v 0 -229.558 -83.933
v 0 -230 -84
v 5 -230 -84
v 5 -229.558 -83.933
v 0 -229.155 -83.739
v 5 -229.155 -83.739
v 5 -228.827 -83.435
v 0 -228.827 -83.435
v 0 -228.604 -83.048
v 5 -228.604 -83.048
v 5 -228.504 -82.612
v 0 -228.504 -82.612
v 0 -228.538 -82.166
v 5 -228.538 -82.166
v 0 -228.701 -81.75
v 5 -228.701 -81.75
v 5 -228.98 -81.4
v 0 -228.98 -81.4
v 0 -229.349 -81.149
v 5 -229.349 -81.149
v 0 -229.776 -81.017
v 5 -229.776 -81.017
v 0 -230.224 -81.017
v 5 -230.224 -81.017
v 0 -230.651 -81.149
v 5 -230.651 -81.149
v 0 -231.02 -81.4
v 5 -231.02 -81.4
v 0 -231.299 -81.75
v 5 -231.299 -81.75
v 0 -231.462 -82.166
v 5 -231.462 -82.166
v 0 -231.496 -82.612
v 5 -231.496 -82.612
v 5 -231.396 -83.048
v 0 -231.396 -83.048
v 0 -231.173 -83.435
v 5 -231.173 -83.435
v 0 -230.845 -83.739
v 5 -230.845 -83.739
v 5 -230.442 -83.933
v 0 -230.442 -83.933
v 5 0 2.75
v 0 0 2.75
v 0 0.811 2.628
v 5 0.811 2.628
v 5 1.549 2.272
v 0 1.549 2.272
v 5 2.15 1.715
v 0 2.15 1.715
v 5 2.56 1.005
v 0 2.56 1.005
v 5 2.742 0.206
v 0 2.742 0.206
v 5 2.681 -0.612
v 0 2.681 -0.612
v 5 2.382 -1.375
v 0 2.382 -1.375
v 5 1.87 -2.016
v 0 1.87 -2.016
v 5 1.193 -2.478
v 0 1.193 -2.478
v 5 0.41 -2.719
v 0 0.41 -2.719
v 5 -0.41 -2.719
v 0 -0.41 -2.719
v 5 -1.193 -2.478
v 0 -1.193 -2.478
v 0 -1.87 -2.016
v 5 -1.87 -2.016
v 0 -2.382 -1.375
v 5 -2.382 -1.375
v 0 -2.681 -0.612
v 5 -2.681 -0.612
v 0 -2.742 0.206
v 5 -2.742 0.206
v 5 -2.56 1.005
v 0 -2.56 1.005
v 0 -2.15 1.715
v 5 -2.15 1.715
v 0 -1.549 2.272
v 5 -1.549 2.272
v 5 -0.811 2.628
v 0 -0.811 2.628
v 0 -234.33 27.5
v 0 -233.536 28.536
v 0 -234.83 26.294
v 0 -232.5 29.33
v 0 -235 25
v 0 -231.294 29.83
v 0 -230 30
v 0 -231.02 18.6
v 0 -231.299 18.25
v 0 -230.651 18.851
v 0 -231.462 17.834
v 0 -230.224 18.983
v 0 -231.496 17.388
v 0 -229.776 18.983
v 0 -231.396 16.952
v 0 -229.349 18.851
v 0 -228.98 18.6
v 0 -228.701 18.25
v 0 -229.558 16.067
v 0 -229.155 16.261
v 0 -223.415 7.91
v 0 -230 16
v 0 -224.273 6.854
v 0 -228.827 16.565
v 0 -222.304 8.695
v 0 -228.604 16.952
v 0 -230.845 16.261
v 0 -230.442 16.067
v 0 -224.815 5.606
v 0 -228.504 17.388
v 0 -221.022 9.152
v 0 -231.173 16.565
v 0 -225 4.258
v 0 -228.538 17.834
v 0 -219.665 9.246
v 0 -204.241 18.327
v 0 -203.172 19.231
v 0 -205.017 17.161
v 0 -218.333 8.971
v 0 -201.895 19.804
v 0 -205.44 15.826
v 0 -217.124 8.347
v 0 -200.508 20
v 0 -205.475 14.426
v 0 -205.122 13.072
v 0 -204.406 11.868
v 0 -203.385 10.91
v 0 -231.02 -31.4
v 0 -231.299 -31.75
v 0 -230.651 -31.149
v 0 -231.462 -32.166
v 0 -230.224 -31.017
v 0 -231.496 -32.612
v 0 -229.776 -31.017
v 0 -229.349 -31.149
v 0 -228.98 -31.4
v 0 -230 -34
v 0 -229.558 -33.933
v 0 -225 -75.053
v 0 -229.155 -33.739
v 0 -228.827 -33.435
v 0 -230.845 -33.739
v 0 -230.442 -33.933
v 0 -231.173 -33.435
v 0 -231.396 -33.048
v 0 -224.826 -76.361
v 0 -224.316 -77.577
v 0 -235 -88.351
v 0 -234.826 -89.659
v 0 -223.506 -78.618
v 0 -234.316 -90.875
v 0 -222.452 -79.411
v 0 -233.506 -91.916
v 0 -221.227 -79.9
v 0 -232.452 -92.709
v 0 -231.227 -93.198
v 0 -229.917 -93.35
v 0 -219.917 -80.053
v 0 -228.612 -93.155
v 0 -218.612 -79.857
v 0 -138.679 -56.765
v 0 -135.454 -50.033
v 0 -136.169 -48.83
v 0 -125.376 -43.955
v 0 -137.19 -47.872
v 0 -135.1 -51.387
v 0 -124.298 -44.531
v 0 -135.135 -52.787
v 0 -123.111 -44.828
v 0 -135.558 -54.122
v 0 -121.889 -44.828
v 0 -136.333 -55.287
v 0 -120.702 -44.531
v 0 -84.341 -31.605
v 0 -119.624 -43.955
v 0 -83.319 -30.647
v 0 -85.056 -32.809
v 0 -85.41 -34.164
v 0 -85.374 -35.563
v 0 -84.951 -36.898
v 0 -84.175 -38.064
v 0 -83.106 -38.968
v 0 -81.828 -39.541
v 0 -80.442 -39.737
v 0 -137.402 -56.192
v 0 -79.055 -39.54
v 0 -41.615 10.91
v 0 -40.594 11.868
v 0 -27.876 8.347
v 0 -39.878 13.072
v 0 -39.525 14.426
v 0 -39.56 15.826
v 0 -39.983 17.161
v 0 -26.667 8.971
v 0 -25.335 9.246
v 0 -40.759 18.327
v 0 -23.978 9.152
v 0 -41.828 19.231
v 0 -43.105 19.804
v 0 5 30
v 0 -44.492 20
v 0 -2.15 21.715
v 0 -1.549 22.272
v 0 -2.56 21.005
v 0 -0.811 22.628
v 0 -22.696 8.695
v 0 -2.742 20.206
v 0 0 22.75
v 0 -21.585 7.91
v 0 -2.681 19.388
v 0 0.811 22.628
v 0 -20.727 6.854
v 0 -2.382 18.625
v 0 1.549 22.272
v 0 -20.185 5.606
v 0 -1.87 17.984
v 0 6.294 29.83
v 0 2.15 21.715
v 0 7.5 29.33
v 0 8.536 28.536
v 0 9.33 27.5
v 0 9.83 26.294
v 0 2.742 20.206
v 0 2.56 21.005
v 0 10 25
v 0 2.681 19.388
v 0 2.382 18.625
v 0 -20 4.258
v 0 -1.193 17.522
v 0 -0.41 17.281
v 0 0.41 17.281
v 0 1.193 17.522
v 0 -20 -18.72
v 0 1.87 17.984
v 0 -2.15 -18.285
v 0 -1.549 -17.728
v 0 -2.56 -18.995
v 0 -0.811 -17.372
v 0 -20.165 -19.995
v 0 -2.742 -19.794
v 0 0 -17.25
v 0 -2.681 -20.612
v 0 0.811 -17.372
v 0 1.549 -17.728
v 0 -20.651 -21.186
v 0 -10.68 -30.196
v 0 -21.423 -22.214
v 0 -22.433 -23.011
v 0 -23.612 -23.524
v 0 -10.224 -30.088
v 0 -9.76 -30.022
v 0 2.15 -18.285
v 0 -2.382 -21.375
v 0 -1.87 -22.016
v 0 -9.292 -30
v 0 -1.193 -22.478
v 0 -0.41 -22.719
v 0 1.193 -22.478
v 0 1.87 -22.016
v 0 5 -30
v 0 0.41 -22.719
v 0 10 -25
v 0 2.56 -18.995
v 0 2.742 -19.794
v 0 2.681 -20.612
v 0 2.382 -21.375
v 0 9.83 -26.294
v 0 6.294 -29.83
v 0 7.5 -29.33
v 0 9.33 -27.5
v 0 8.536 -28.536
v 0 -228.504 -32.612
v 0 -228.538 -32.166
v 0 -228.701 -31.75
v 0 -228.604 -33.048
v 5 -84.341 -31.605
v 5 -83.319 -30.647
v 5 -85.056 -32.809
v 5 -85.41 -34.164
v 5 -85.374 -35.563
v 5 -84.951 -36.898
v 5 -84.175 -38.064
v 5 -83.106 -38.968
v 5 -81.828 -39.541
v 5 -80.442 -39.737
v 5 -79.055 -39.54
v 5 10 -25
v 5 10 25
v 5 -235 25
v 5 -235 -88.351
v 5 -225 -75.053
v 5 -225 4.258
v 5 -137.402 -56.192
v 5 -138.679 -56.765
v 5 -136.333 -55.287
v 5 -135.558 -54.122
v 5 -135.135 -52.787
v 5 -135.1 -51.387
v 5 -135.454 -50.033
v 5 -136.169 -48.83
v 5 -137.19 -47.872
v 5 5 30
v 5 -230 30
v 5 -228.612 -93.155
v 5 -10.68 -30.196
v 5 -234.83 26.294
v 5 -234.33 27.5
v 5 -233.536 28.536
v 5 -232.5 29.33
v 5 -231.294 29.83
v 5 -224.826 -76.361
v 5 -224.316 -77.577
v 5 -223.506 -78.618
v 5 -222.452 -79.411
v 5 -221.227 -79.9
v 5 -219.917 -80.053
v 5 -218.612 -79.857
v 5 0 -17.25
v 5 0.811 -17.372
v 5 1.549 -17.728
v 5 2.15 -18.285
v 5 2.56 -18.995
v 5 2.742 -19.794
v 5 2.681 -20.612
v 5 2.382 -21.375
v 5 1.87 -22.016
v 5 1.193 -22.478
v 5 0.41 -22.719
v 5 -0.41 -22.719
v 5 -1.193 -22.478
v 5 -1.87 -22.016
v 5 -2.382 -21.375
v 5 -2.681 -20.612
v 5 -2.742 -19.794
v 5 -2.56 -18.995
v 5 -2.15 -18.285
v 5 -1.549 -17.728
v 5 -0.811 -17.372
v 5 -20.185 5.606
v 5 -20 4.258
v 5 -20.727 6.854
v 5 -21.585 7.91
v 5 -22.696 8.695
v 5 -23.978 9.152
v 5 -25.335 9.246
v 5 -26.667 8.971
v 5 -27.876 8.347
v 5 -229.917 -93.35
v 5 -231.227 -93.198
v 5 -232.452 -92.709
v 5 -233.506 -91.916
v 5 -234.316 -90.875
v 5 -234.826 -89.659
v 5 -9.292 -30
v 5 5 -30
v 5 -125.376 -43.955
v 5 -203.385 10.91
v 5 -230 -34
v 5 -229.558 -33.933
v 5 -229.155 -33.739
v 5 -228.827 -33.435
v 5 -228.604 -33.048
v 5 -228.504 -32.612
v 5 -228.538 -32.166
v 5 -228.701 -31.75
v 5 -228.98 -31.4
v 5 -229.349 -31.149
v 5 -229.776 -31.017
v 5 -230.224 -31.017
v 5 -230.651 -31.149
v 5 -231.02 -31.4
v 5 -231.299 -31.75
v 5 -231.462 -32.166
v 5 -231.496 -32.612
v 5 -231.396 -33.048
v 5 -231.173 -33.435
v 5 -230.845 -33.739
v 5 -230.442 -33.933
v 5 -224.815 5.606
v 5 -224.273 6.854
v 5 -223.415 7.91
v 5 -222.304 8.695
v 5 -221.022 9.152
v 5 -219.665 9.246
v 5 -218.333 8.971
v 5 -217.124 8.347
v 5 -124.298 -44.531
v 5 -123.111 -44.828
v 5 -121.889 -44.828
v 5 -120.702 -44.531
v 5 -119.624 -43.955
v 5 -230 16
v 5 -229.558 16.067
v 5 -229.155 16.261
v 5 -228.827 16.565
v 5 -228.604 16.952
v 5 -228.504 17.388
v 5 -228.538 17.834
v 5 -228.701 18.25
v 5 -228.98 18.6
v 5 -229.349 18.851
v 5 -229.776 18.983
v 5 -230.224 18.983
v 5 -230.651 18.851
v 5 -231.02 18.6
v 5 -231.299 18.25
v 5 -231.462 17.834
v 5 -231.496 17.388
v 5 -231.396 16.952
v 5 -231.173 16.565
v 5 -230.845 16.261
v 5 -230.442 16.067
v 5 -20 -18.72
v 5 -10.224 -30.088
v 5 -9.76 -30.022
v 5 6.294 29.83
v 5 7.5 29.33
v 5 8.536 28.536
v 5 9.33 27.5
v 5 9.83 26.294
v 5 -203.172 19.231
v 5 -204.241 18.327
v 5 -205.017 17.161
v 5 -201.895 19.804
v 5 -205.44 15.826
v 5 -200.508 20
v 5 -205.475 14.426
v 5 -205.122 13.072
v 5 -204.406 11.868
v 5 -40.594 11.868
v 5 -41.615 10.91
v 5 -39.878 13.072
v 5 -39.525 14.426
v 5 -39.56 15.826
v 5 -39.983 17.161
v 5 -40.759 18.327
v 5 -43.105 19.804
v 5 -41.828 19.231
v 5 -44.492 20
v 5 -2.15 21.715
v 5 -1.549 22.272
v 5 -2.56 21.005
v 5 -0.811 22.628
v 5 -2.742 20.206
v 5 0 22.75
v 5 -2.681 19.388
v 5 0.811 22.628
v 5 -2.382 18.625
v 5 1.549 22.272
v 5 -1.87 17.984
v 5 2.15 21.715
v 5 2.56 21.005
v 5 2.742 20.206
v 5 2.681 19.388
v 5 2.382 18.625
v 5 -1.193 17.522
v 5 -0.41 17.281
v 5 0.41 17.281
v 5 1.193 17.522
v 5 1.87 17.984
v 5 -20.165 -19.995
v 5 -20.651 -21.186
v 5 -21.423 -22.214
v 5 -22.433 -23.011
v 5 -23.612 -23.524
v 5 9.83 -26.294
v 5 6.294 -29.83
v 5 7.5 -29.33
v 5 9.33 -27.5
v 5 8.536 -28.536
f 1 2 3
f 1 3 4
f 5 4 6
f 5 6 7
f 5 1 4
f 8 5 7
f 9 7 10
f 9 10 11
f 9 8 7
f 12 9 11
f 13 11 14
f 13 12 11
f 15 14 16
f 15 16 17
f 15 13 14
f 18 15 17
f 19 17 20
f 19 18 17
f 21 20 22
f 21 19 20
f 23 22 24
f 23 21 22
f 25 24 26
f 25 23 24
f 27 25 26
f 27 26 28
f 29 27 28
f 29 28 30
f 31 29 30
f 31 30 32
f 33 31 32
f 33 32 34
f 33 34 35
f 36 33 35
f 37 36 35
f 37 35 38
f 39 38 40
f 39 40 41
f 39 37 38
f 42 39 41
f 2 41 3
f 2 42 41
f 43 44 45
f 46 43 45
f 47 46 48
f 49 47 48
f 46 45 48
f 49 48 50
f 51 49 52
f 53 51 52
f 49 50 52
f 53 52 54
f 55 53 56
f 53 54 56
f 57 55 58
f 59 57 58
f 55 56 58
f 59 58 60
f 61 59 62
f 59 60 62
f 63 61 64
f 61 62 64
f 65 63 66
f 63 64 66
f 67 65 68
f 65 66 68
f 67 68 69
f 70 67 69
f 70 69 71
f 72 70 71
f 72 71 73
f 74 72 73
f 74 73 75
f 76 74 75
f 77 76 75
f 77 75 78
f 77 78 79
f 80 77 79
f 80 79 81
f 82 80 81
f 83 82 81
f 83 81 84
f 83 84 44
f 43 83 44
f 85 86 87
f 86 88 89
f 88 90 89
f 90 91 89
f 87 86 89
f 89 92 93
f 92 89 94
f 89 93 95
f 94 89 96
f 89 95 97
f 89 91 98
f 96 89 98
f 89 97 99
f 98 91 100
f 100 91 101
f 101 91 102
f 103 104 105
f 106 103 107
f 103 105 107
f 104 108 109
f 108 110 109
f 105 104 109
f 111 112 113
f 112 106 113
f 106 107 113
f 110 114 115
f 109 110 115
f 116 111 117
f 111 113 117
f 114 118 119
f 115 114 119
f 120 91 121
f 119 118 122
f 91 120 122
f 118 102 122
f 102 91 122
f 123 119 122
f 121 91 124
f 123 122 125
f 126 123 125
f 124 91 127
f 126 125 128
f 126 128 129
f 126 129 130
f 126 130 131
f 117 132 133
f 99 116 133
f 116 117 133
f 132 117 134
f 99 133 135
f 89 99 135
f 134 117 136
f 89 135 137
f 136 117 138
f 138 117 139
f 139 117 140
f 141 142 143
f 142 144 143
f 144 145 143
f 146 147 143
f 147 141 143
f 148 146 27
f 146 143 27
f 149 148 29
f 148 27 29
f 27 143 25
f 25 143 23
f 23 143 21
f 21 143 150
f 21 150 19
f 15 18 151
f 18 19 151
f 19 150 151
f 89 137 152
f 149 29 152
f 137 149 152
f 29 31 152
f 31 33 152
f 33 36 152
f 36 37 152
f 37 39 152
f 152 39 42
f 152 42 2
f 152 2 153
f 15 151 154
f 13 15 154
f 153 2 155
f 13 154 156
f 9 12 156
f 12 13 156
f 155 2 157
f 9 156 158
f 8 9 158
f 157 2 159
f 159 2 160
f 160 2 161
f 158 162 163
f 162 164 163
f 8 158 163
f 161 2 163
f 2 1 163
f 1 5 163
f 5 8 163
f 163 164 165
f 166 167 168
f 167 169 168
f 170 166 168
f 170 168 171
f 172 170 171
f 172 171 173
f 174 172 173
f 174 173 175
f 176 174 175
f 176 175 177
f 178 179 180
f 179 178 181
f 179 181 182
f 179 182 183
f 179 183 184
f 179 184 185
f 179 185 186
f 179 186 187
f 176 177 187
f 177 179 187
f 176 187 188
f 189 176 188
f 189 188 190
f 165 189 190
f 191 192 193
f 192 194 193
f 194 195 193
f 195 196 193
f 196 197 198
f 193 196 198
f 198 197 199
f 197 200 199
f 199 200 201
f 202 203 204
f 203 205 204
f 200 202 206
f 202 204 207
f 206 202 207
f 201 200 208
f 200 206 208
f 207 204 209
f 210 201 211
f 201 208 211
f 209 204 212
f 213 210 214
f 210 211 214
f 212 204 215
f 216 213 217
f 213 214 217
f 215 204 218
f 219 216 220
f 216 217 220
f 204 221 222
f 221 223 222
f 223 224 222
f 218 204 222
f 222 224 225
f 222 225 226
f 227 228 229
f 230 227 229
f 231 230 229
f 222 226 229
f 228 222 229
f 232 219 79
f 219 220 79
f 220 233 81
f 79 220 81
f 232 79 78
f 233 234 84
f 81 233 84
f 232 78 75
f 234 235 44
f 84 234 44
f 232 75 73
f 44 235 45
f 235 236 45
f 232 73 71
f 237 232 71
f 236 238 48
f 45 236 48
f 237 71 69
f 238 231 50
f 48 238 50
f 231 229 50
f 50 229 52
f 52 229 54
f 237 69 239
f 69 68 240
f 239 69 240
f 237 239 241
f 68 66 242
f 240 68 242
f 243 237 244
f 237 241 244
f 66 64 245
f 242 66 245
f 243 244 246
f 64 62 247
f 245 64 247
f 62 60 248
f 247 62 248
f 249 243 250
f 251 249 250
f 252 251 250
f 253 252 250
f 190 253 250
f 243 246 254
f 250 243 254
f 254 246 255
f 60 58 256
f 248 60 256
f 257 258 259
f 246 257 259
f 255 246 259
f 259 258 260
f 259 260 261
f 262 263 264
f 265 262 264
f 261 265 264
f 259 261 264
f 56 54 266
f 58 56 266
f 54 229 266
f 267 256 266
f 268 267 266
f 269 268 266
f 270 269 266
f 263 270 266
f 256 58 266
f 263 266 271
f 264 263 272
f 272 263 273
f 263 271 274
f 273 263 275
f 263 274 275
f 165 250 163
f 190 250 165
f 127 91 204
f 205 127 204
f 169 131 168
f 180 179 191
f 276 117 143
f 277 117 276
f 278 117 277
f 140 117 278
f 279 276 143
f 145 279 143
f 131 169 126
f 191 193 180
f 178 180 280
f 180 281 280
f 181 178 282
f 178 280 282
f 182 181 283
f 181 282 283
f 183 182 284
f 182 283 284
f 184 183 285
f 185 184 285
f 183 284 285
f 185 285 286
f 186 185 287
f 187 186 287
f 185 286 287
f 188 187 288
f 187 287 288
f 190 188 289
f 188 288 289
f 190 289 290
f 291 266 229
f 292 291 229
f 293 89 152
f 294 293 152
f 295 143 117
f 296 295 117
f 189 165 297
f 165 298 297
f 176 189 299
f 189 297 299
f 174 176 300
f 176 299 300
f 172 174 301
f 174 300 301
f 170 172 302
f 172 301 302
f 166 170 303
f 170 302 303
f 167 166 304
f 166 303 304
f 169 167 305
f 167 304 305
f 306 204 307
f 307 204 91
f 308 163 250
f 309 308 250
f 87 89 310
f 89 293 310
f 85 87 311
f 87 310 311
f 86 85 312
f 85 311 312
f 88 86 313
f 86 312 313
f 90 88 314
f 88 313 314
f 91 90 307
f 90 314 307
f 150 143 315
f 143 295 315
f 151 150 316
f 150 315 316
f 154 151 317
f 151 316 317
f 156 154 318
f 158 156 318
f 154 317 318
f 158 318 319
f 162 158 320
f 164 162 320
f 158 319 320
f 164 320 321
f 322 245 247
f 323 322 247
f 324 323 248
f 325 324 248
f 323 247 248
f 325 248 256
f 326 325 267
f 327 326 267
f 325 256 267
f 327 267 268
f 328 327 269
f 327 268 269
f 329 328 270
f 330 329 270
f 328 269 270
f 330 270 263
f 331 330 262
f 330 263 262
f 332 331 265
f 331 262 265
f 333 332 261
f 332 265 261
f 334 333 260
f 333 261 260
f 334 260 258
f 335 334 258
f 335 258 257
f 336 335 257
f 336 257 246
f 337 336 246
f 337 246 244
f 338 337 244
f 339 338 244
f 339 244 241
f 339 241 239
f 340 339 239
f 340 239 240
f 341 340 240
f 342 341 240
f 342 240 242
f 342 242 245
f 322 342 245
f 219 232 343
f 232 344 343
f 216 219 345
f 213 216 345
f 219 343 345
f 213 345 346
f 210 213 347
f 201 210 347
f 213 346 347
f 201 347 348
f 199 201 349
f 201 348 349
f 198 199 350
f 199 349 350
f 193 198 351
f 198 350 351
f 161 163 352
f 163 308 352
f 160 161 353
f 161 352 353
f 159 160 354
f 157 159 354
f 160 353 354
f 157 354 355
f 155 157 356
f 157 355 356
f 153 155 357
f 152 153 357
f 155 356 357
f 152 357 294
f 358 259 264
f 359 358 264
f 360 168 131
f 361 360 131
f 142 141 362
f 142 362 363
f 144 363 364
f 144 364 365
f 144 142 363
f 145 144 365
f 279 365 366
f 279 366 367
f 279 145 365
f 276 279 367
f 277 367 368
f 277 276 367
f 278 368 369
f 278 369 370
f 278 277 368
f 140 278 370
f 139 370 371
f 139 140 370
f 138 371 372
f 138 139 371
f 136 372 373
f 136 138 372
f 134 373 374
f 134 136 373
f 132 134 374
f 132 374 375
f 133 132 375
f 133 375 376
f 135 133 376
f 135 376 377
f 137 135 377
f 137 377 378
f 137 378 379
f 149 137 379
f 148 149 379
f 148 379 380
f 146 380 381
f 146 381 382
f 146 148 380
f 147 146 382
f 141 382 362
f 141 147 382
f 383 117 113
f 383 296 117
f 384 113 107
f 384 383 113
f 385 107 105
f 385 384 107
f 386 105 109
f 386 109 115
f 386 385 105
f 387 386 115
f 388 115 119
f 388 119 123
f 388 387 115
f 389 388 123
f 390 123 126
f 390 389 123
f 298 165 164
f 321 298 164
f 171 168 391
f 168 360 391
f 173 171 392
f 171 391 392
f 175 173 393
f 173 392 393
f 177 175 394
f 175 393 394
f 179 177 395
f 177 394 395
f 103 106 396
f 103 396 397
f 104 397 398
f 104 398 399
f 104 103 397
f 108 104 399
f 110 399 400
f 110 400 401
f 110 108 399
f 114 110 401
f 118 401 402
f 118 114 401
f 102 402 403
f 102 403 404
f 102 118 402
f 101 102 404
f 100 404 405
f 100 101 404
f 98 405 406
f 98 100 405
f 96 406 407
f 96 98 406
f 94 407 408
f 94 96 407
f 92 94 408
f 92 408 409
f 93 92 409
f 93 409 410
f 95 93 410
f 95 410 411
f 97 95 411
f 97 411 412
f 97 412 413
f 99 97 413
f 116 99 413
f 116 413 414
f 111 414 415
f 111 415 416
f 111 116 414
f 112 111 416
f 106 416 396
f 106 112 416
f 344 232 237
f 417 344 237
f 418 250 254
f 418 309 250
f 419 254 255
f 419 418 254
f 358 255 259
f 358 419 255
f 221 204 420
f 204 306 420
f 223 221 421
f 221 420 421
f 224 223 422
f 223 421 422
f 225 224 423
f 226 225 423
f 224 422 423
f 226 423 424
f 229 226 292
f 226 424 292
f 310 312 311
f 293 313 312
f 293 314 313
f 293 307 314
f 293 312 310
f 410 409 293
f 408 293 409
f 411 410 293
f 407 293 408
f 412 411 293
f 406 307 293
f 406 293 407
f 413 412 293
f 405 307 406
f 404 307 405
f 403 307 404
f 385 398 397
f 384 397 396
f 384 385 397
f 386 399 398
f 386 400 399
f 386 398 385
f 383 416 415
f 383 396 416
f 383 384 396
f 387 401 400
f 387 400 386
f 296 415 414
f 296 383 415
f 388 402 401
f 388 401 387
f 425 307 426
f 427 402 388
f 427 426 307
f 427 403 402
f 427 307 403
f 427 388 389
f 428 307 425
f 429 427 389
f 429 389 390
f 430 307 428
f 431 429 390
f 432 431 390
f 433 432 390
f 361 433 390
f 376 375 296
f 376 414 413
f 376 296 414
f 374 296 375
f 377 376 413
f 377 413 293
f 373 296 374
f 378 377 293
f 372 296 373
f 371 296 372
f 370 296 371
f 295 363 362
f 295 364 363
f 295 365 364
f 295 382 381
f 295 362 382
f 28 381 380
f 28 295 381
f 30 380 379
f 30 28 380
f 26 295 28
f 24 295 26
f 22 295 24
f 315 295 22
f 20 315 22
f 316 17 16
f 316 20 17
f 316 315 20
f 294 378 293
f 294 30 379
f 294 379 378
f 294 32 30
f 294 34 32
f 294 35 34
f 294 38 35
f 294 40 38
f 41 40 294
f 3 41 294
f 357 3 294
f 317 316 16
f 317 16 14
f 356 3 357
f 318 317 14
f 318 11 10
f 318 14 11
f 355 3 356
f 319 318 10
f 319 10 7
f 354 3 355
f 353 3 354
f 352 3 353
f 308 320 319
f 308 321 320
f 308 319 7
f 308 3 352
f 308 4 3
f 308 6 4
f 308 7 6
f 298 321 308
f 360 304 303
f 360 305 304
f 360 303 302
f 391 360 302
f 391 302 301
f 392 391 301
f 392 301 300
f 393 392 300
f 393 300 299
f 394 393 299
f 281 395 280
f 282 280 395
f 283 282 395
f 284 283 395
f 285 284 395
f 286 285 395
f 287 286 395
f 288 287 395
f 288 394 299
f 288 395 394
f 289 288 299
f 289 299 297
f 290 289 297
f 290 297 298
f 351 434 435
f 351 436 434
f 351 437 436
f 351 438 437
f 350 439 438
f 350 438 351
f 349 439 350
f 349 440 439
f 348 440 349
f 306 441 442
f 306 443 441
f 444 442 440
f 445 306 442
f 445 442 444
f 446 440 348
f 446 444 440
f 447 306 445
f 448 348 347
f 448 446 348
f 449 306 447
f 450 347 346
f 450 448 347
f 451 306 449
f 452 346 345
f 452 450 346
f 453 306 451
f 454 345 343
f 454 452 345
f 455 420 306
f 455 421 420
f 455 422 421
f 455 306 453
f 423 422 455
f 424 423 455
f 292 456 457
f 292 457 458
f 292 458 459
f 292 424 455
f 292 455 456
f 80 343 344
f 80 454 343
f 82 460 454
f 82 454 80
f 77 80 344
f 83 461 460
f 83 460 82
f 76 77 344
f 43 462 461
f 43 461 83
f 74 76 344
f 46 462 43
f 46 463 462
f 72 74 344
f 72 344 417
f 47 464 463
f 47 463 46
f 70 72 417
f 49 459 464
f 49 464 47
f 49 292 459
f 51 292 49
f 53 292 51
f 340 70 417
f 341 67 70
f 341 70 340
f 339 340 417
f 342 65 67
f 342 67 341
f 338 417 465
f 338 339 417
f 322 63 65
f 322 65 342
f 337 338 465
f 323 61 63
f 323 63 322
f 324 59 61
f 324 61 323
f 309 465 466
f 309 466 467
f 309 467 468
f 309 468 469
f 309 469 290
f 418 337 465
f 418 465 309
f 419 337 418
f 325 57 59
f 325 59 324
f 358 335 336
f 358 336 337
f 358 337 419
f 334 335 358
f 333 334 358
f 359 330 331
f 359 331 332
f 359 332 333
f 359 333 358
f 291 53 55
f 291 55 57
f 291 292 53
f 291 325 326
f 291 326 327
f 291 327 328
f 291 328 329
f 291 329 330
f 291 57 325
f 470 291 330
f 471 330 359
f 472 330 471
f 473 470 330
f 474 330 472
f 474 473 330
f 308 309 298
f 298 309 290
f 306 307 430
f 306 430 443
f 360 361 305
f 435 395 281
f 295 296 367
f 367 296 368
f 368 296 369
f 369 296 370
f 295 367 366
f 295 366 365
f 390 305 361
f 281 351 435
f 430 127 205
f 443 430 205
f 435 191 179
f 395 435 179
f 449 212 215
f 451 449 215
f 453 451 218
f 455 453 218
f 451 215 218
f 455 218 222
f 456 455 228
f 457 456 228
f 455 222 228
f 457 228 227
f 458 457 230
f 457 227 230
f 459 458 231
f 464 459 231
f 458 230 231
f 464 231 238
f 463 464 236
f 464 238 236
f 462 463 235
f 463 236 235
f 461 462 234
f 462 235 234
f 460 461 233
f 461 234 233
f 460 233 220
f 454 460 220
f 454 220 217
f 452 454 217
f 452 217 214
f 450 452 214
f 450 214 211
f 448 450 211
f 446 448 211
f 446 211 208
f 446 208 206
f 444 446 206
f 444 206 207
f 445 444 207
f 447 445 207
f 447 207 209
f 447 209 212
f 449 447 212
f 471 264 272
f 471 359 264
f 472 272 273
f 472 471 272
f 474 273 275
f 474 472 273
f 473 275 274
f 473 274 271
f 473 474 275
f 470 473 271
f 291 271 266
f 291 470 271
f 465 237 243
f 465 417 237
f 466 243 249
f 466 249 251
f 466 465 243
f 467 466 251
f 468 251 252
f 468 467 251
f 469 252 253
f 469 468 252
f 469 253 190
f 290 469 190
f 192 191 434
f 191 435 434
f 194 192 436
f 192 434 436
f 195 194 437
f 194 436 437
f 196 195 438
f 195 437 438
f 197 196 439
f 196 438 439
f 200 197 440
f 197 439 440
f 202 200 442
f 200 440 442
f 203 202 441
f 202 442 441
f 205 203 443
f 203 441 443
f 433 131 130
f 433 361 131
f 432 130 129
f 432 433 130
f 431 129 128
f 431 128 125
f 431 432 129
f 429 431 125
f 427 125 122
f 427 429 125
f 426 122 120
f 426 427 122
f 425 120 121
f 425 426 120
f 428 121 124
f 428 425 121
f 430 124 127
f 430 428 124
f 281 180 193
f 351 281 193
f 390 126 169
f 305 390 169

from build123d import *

# Parameters (mm, degrees)
SKETCH1_R            = 1.5
BOSS_EXTRUDE1_DEPTH  = 5
M5_CLEARANCE_HOLE1_D = 5.5
FILLET2_R            = 5


with BuildPart() as part:
    # Sketch1 → Boss-Extrude1 (new body)
    with BuildSketch(Plane(origin=(0, 0, 0), x_dir=(0, 0, -1), z_dir=(1, 0, 0))):
        Polygon((95, -235), (30, -10), (30, 10), (-30, 10), (-30, -235), align=None)
        with Locations((-17.5, -230)):
            Circle(SKETCH1_R, mode=Mode.SUBTRACT)
        with Locations((32.5, -230)):
            Circle(SKETCH1_R, mode=Mode.SUBTRACT)
        with Locations((82.5, -230)):
            Circle(SKETCH1_R, mode=Mode.SUBTRACT)
        Polygon((-13.887165787, -225), (53.870859832, -128.66078689), (81.702188063, -225), align=None, mode=Mode.SUBTRACT)
        Polygon((-20, -216.308695426), (-20, -28.691304574), (45.978242739, -122.5), align=None, mode=Mode.SUBTRACT)
        Polygon((22.479965841, -20), (47.830060977, -107.750329315), (-13.887165787, -20), align=None, mode=Mode.SUBTRACT)
    extrude(amount=BOSS_EXTRUDE1_DEPTH)

    # M5 Clearance Hole1 (through all)
    with Locations(Plane(origin=(5, 0, 0), x_dir=(0, 0, -1), z_dir=(1, 0, 0))):
        with Locations((0, 0), (20, 0), (-20, 0)):
            Hole(M5_CLEARANCE_HOLE1_D / 2)

    # Fillet2
    fillet2_edges = [part.edges().sort_by_distance(p)[0] for p in [
        (2.5, -235, -95),
        (2.5, -235, 30),
        (2.5, 10, 30),
        (2.5, 10, -30),
        (2.5, -10, -30),
        (2.5, -216.308695426, 20),
        (2.5, -122.5, -45.978242739),
        (2.5, -28.691304574, 20),
        (2.5, -20, -22.479965841),
        (2.5, -20, 13.887165787),
        (2.5, -107.750329315, -47.830060977),
        (2.5, -225, 13.887165787),
        (2.5, -225, -81.702188063),
        (2.5, -128.66078689, -53.870859832),
    ]]
    fillet(fillet2_edges, radius=FILLET2_R)


solid = part.part
